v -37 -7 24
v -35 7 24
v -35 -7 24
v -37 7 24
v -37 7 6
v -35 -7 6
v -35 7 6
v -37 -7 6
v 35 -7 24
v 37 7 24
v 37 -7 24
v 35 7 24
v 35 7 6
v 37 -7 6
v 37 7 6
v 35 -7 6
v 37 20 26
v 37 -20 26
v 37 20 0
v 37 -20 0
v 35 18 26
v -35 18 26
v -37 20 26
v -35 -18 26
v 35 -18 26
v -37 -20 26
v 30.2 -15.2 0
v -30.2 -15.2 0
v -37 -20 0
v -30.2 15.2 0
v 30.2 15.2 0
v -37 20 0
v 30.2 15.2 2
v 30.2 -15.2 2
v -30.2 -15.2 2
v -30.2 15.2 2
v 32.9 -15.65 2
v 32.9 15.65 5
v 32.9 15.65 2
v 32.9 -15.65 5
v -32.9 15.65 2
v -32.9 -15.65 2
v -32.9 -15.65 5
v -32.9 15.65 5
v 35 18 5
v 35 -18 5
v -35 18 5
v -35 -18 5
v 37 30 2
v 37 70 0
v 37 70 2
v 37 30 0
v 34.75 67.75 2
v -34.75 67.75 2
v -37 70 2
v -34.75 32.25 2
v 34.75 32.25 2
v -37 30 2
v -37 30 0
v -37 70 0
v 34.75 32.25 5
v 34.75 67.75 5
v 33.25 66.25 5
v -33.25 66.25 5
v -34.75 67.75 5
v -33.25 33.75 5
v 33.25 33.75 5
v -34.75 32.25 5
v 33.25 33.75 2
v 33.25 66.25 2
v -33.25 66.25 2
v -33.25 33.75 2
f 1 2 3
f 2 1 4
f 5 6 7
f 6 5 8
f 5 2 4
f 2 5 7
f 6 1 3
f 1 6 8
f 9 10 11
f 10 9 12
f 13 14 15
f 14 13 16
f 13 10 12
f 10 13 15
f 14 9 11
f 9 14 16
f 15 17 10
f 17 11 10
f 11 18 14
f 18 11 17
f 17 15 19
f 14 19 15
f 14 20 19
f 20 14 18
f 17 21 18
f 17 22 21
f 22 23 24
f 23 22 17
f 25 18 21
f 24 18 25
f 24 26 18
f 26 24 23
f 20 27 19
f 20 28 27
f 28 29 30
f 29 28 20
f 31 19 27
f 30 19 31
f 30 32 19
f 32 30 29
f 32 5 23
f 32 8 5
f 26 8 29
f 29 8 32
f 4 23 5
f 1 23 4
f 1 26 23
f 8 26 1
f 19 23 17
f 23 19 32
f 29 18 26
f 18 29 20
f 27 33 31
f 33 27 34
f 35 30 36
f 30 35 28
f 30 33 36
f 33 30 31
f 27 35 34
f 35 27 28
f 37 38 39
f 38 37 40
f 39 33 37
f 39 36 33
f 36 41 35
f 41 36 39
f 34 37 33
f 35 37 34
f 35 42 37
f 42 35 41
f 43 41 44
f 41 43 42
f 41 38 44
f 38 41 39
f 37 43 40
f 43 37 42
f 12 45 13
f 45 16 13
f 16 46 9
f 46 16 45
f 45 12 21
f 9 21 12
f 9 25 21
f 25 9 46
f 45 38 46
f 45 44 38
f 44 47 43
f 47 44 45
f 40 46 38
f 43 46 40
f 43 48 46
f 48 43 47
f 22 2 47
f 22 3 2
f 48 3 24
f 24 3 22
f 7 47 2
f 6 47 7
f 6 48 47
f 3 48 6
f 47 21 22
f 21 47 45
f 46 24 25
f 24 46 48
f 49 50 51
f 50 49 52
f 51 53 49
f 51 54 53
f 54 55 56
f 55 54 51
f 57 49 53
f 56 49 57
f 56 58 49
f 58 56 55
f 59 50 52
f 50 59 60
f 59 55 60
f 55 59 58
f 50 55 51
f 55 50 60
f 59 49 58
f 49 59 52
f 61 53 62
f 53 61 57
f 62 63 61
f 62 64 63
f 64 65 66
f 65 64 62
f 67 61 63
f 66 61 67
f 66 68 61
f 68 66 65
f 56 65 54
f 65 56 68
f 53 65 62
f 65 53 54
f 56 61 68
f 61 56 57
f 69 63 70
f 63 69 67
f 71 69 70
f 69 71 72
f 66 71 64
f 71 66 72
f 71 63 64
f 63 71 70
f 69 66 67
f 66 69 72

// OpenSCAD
// PicoMado / Waveshare 19406 + Raspberry Pi Pico W
// Fit-test prototype. Units mm. No physical fit verification.
// Select body, lid, layout or assembly. STL files use identical rectangular geometry.
part = "layout";
pcb_w = 65;
pcb_h = 30.5;
pcb_clearance = 0.4; // each side
outer_w = 74;
outer_h = 40;
body_depth = 26;
wall = 2;
front_t = 2;
guide_depth = 3;
window_w = 60.4; // exposes entire glass outline, not just active pixels
window_h = 30.4;
window_x = 0; // adjust after checking actual glass placement
window_y = 0;
usb_w = 14;
usb_front_z = 6;
usb_back_z = 24;
lid_t = 2;
lip_h = 3;
lip_wall = 1.5;
lid_clearance = 0.25; // each side; alignment fit, not a snap latch

module rect(w,h,z0,d) { translate([-w/2,-h/2,z0]) cube([w,h,d]); }
module body() {
    difference() {
        rect(outer_w,outer_h,0,body_depth);
        translate([window_x,window_y,0]) rect(window_w,window_h,-1,front_t+2);
        rect(pcb_w+2*pcb_clearance,pcb_h+2*pcb_clearance,front_t,guide_depth+1);
        rect(outer_w-2*wall,outer_h-2*wall,front_t+guide_depth,body_depth);
        for (s=[-1,1]) translate([s*(outer_w/2-2),0,0])
            rect(6,usb_w,usb_front_z,usb_back_z-usb_front_z);
    }
}
module lid() {
    difference() {
        union() {
            rect(outer_w,outer_h,0,lid_t);
            rect(outer_w-2*wall-2*lid_clearance,outer_h-2*wall-2*lid_clearance,lid_t,lip_h);
        }
        rect(outer_w-2*wall-2*lid_clearance-2*lip_wall,outer_h-2*wall-2*lid_clearance-2*lip_wall,lid_t,lip_h+1);
    }
}
if(part=="body") body();
if(part=="lid") lid();
if(part=="layout") { body(); translate([0,outer_h+10,0]) lid(); }
if(part=="assembly") {
    color("SteelBlue") body();
    color("Tan") translate([0,0,body_depth+lid_t]) mirror([0,0,1]) lid();
}
